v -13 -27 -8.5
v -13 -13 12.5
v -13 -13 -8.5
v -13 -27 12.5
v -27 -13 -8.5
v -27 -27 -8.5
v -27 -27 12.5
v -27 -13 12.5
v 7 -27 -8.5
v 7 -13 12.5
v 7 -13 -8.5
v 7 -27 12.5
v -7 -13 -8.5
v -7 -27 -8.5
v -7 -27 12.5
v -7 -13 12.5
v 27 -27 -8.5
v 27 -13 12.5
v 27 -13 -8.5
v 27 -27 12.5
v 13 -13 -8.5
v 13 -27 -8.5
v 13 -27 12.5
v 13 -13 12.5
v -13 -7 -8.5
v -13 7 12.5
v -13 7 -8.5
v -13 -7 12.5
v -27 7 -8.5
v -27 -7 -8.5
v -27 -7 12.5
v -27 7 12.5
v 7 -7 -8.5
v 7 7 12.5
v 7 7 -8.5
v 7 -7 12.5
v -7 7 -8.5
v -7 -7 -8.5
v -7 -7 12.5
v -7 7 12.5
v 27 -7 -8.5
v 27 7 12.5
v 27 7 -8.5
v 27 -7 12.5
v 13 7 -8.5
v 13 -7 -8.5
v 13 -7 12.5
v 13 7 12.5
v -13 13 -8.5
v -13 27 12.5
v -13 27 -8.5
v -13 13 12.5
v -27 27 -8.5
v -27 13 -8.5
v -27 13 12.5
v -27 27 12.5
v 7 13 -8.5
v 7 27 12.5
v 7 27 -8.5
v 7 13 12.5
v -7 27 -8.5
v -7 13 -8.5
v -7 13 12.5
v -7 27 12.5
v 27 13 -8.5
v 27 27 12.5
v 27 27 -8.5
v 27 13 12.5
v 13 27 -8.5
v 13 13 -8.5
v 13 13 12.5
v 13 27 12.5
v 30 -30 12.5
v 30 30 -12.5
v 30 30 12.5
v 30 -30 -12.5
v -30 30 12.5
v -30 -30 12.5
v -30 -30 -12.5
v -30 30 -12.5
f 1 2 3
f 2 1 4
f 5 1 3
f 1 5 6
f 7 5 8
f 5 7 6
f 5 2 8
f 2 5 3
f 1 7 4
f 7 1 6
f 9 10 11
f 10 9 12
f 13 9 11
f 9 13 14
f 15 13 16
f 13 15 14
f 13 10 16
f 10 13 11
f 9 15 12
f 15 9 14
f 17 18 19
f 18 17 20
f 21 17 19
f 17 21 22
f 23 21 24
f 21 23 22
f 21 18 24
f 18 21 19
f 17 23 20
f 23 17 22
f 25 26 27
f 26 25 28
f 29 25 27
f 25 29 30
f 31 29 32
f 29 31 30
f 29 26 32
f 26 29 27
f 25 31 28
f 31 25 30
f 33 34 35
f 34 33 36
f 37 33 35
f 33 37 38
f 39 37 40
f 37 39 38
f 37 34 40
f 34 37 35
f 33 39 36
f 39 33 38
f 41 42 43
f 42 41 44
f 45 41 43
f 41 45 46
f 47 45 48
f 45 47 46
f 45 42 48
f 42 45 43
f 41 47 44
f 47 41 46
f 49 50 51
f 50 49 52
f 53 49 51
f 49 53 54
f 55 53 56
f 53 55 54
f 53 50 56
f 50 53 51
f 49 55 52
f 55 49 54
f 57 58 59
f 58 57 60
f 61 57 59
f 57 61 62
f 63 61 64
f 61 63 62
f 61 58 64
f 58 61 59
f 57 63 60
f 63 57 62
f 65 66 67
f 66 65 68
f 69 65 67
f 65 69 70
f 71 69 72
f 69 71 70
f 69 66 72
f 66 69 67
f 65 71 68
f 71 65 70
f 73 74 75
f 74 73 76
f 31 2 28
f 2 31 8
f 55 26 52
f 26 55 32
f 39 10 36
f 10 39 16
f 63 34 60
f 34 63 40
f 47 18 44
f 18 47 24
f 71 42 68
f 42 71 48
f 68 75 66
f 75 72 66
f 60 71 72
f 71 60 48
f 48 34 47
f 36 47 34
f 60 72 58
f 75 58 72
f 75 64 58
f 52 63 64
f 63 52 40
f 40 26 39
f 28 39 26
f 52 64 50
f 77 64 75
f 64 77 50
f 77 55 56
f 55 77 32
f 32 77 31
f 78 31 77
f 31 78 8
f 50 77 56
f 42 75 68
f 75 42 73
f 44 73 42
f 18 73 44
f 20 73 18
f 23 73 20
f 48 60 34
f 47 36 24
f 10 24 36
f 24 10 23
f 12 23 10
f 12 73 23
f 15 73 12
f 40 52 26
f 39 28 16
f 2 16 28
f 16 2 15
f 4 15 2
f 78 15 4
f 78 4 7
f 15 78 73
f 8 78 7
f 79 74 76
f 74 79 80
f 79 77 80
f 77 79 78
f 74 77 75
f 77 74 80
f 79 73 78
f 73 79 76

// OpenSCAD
$fn = 32;

// ----------------------------------------------------------------------
// Pocket plate 60 x 60 x 25
// 3 x 3 pockets 14 mm square, 21 mm deep
// ----------------------------------------------------------------------

// --- parameters (mm) ---
thickness = 25;  // plate thickness
floor_t = 4;     // material left under each pocket
pocket = 14;     // pocket side length
pitch_x = 20;    // pocket pitch along X
pitch_y = 20;    // pocket pitch along Y
cols = 3;        // pockets per row
rows = 3;        // rows of pockets

// --- derived feature positions (mm) ---
depth = thickness - floor_t;        // = 21   pocket depth, down to the floor
span_x = (cols - 1) * pitch_x;      // = 40   distance between outer pockets
span_y = (rows - 1) * pitch_y;      // = 40   distance between outer pocket rows
origin_x = -span_x / 2;             // = -20   X of the first pocket
origin_y = -span_y / 2;             // = -20   Y of the first pocket
plate = [span_x + pocket + 6, span_y + pocket + 6, thickness];  // = [60, 60, 25]   overall size: pockets plus 3 mm of wall on each side
feature_centers = [
  [origin_x + 0 * pitch_x, origin_y + 0 * pitch_y],
  [origin_x + 1 * pitch_x, origin_y + 0 * pitch_y],
  [origin_x + 2 * pitch_x, origin_y + 0 * pitch_y],
  [origin_x + 0 * pitch_x, origin_y + 1 * pitch_y],
  [origin_x + 1 * pitch_x, origin_y + 1 * pitch_y],
  [origin_x + 2 * pitch_x, origin_y + 1 * pitch_y],
  [origin_x + 0 * pitch_x, origin_y + 2 * pitch_y],
  [origin_x + 1 * pitch_x, origin_y + 2 * pitch_y],
  [origin_x + 2 * pitch_x, origin_y + 2 * pitch_y]
];   // pocket centres, used verbatim by the cutter loop

// plate outline, then one pocket per centre in feature_centers
difference() {
  cube(plate, center = true);
  for (centre = feature_centers)
    translate([centre[0] - pocket / 2, centre[1] - pocket / 2, plate[2] / 2 - depth])
      cube([pocket, pocket, depth + 1]);  // centred on the declared pocket centre
}
